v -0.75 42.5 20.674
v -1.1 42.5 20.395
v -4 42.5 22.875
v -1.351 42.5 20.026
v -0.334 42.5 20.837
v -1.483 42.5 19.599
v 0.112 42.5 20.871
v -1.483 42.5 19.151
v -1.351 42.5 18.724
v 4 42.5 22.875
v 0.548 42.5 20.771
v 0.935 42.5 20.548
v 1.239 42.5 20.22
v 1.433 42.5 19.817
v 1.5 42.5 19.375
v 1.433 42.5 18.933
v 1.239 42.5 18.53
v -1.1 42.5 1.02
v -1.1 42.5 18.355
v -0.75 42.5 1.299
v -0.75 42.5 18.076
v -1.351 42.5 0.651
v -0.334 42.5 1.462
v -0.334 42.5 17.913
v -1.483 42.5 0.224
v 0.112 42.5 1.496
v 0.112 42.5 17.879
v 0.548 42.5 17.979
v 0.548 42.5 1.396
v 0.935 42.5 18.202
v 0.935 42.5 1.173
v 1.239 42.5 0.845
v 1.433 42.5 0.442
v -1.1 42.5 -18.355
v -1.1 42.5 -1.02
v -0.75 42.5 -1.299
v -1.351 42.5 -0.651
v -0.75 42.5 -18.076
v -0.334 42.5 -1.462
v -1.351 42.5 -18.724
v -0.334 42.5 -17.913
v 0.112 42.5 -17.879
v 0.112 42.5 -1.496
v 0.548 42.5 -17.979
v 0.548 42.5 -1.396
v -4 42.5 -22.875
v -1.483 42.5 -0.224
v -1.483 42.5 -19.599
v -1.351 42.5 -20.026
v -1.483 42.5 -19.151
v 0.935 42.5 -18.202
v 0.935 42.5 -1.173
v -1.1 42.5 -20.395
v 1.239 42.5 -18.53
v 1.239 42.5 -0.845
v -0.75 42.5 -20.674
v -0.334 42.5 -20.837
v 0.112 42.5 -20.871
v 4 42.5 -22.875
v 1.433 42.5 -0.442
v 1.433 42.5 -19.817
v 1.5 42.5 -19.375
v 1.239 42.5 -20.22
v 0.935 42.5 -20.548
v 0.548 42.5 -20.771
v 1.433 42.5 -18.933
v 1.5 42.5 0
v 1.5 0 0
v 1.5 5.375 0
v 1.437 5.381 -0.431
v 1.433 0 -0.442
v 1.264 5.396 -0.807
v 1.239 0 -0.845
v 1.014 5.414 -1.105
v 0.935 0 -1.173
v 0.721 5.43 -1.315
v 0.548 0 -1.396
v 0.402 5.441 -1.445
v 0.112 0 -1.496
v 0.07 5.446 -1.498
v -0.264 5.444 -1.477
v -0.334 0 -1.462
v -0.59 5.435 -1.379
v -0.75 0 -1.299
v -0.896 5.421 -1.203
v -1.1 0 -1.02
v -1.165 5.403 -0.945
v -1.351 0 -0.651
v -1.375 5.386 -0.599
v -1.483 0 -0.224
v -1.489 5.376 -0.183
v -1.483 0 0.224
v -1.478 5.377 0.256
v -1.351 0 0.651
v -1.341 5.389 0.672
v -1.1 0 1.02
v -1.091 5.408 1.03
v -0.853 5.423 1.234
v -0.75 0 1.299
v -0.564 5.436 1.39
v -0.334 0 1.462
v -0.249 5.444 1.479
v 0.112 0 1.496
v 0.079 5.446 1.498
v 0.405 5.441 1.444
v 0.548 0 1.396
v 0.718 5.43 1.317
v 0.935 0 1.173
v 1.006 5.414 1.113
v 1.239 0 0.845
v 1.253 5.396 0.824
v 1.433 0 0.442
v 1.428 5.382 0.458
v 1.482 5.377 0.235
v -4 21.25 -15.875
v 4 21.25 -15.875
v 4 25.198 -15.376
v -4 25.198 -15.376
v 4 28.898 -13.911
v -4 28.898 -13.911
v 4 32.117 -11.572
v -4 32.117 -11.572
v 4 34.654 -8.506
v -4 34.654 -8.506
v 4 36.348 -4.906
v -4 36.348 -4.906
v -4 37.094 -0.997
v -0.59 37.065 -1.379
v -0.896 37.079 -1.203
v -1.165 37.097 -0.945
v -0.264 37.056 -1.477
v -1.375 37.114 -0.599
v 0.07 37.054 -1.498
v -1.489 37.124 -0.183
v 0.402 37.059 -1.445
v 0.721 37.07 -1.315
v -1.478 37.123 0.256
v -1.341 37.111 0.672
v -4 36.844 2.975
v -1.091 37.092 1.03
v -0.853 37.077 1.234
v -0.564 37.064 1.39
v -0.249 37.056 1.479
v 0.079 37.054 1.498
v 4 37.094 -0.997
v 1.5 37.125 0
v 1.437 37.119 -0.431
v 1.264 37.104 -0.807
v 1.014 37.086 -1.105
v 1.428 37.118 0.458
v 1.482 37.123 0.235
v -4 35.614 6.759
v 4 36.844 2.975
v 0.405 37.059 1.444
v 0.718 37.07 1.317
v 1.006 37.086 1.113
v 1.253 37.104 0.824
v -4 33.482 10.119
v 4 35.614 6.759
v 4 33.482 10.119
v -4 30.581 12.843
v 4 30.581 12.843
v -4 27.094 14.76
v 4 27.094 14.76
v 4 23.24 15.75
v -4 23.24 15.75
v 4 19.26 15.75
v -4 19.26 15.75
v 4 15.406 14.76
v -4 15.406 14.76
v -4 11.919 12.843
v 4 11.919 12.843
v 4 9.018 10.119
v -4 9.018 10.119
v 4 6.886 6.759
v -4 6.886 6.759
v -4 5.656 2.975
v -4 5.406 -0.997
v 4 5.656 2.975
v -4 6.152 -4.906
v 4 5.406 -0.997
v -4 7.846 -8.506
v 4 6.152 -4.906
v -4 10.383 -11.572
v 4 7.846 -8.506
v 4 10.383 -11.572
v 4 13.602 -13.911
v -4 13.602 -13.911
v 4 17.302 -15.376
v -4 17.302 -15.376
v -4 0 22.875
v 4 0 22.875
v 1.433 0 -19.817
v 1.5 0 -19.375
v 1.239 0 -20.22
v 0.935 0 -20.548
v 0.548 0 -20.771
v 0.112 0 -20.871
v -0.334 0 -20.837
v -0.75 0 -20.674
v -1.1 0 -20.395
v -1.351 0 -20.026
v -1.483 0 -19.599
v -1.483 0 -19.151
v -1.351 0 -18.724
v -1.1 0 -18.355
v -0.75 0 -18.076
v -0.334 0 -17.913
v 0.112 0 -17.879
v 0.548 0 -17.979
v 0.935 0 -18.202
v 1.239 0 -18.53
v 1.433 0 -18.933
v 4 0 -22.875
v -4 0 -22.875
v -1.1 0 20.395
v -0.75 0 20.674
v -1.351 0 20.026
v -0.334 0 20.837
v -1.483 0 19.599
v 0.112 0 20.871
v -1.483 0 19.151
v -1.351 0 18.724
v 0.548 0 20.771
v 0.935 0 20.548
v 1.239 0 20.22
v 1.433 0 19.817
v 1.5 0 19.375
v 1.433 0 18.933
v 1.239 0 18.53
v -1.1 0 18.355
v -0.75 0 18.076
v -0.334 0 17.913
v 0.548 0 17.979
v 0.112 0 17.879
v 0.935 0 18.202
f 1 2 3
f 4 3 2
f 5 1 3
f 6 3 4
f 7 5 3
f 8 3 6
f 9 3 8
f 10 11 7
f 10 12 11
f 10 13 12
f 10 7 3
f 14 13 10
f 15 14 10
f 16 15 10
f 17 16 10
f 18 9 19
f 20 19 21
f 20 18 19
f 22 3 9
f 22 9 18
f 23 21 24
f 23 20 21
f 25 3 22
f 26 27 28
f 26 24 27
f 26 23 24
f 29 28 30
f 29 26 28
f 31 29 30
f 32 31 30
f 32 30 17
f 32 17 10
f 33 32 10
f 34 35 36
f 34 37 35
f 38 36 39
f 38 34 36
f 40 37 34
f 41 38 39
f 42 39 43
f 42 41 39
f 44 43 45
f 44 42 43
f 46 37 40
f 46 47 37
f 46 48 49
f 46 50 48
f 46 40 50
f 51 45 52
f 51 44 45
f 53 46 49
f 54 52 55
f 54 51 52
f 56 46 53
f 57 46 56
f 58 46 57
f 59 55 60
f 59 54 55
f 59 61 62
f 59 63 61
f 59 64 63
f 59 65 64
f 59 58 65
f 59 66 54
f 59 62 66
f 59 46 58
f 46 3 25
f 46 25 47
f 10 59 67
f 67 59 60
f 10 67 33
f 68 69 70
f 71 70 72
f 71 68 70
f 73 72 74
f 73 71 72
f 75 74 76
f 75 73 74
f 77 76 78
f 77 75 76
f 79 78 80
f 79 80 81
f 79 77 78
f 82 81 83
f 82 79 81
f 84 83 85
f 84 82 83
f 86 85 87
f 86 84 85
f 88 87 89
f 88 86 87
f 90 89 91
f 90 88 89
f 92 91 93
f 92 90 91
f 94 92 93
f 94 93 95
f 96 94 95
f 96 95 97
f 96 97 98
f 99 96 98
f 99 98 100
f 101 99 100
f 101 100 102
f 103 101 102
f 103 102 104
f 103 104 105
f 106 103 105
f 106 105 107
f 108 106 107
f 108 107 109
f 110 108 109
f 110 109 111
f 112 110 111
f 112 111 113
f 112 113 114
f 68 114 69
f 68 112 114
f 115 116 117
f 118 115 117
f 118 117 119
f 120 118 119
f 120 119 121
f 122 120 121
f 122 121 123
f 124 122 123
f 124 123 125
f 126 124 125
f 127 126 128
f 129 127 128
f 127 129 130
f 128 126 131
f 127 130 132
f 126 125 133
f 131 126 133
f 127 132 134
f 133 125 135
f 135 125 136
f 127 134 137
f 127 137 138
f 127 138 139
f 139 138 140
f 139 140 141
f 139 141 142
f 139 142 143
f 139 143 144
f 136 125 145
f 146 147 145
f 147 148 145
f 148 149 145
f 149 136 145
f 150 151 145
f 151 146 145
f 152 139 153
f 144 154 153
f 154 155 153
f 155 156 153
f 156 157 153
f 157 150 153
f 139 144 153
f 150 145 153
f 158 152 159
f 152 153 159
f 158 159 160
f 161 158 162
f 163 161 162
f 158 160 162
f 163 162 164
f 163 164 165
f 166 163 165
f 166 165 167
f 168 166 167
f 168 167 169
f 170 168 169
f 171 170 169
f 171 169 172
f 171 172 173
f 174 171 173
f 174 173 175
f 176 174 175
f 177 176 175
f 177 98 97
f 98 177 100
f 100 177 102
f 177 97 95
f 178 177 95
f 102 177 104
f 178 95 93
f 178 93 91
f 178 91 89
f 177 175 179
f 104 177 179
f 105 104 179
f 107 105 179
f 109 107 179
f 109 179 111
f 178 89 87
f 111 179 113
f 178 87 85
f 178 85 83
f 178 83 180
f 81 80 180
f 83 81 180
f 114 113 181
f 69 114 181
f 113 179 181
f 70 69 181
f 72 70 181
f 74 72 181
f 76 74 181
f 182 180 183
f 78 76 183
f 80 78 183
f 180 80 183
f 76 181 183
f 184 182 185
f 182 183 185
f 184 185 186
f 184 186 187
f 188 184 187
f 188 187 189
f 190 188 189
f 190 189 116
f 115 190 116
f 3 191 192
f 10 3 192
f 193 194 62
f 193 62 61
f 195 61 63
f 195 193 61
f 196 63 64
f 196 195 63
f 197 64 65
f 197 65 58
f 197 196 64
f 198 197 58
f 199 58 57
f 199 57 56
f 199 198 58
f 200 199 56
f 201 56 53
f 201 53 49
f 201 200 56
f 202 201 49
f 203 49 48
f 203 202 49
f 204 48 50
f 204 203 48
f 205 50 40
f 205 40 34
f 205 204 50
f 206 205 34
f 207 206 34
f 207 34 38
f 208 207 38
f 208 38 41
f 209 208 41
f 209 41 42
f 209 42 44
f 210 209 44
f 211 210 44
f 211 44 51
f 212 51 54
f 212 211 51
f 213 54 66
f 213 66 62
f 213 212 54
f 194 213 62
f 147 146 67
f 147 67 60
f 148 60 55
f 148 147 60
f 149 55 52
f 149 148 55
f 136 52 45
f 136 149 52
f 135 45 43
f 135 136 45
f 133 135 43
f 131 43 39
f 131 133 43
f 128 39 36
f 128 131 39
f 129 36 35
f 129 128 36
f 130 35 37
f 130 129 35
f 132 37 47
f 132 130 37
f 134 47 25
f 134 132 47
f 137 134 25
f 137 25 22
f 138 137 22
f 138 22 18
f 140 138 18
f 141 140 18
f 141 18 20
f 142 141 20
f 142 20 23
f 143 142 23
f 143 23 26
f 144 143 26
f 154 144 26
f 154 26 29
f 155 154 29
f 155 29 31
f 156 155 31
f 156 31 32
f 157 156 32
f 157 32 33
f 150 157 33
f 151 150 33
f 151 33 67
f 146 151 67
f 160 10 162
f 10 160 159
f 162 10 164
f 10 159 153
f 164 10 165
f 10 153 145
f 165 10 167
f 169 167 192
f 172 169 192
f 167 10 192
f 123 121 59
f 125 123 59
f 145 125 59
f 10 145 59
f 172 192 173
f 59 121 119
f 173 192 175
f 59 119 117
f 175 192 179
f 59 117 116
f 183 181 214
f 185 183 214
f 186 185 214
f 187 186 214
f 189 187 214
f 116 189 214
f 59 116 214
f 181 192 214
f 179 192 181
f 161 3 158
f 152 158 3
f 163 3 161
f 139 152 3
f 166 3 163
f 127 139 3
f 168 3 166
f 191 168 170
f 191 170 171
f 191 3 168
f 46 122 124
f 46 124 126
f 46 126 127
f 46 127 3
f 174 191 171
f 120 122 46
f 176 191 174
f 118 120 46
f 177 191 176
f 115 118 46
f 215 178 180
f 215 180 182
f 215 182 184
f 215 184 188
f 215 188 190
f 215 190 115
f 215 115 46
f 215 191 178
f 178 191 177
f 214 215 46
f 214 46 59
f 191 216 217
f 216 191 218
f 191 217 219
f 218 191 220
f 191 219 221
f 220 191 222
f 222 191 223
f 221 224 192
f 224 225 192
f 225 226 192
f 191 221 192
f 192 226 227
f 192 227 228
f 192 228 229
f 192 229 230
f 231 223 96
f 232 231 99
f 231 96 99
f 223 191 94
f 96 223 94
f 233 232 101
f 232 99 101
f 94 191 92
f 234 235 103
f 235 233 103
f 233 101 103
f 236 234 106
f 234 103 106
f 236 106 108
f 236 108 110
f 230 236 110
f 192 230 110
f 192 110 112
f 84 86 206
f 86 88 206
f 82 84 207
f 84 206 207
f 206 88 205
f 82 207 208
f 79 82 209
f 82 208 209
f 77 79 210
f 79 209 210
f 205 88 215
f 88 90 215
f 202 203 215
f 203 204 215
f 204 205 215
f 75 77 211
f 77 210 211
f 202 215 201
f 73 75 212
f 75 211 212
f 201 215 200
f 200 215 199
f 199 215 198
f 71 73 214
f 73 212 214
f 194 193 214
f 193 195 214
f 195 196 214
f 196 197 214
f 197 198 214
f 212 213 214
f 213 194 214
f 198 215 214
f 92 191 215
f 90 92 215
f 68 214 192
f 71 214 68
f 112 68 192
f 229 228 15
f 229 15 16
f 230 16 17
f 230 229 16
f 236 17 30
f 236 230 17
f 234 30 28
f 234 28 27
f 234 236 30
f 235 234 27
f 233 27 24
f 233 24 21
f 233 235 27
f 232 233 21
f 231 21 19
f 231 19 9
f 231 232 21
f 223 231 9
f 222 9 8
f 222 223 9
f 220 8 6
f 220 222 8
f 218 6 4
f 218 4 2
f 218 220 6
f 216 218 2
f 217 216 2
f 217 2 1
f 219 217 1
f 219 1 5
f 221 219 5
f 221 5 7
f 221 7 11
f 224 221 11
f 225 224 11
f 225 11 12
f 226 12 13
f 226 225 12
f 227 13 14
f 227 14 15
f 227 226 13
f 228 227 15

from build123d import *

# Parameters (mm, degrees)
SKETCH2_W           = 8.001
SKETCH2_H           = 45.75
SKETCH2_R           = 1.5
BOSS_EXTRUDE1_DEPTH = 42.5
SKETCH3_R           = 15.875
CUT_EXTRUDE1_DEPTH  = 42.5


with BuildPart() as part:
    # Sketch2 → Boss-Extrude1 (new body)
    with BuildSketch(Plane(origin=(0, 0, 0), x_dir=(1, 0, 0), z_dir=(0, 1, 0))):
        Rectangle(SKETCH2_W, SKETCH2_H)
        Circle(SKETCH2_R, mode=Mode.SUBTRACT)
        with Locations((0, 19.375)):
            Circle(SKETCH2_R, mode=Mode.SUBTRACT)
        with Locations((0, -19.375)):
            Circle(SKETCH2_R, mode=Mode.SUBTRACT)
    extrude(amount=BOSS_EXTRUDE1_DEPTH)

    # Sketch3 → Cut-Extrude1 (cut)
    with BuildSketch(Plane(origin=(4.0005, 0, 0), x_dir=(0, 0, -1), z_dir=(1, 0, 0))):
        with Locations((0, 21.25)):
            Circle(SKETCH3_R)
    extrude(amount=-CUT_EXTRUDE1_DEPTH, mode=Mode.SUBTRACT)


solid = part.part
